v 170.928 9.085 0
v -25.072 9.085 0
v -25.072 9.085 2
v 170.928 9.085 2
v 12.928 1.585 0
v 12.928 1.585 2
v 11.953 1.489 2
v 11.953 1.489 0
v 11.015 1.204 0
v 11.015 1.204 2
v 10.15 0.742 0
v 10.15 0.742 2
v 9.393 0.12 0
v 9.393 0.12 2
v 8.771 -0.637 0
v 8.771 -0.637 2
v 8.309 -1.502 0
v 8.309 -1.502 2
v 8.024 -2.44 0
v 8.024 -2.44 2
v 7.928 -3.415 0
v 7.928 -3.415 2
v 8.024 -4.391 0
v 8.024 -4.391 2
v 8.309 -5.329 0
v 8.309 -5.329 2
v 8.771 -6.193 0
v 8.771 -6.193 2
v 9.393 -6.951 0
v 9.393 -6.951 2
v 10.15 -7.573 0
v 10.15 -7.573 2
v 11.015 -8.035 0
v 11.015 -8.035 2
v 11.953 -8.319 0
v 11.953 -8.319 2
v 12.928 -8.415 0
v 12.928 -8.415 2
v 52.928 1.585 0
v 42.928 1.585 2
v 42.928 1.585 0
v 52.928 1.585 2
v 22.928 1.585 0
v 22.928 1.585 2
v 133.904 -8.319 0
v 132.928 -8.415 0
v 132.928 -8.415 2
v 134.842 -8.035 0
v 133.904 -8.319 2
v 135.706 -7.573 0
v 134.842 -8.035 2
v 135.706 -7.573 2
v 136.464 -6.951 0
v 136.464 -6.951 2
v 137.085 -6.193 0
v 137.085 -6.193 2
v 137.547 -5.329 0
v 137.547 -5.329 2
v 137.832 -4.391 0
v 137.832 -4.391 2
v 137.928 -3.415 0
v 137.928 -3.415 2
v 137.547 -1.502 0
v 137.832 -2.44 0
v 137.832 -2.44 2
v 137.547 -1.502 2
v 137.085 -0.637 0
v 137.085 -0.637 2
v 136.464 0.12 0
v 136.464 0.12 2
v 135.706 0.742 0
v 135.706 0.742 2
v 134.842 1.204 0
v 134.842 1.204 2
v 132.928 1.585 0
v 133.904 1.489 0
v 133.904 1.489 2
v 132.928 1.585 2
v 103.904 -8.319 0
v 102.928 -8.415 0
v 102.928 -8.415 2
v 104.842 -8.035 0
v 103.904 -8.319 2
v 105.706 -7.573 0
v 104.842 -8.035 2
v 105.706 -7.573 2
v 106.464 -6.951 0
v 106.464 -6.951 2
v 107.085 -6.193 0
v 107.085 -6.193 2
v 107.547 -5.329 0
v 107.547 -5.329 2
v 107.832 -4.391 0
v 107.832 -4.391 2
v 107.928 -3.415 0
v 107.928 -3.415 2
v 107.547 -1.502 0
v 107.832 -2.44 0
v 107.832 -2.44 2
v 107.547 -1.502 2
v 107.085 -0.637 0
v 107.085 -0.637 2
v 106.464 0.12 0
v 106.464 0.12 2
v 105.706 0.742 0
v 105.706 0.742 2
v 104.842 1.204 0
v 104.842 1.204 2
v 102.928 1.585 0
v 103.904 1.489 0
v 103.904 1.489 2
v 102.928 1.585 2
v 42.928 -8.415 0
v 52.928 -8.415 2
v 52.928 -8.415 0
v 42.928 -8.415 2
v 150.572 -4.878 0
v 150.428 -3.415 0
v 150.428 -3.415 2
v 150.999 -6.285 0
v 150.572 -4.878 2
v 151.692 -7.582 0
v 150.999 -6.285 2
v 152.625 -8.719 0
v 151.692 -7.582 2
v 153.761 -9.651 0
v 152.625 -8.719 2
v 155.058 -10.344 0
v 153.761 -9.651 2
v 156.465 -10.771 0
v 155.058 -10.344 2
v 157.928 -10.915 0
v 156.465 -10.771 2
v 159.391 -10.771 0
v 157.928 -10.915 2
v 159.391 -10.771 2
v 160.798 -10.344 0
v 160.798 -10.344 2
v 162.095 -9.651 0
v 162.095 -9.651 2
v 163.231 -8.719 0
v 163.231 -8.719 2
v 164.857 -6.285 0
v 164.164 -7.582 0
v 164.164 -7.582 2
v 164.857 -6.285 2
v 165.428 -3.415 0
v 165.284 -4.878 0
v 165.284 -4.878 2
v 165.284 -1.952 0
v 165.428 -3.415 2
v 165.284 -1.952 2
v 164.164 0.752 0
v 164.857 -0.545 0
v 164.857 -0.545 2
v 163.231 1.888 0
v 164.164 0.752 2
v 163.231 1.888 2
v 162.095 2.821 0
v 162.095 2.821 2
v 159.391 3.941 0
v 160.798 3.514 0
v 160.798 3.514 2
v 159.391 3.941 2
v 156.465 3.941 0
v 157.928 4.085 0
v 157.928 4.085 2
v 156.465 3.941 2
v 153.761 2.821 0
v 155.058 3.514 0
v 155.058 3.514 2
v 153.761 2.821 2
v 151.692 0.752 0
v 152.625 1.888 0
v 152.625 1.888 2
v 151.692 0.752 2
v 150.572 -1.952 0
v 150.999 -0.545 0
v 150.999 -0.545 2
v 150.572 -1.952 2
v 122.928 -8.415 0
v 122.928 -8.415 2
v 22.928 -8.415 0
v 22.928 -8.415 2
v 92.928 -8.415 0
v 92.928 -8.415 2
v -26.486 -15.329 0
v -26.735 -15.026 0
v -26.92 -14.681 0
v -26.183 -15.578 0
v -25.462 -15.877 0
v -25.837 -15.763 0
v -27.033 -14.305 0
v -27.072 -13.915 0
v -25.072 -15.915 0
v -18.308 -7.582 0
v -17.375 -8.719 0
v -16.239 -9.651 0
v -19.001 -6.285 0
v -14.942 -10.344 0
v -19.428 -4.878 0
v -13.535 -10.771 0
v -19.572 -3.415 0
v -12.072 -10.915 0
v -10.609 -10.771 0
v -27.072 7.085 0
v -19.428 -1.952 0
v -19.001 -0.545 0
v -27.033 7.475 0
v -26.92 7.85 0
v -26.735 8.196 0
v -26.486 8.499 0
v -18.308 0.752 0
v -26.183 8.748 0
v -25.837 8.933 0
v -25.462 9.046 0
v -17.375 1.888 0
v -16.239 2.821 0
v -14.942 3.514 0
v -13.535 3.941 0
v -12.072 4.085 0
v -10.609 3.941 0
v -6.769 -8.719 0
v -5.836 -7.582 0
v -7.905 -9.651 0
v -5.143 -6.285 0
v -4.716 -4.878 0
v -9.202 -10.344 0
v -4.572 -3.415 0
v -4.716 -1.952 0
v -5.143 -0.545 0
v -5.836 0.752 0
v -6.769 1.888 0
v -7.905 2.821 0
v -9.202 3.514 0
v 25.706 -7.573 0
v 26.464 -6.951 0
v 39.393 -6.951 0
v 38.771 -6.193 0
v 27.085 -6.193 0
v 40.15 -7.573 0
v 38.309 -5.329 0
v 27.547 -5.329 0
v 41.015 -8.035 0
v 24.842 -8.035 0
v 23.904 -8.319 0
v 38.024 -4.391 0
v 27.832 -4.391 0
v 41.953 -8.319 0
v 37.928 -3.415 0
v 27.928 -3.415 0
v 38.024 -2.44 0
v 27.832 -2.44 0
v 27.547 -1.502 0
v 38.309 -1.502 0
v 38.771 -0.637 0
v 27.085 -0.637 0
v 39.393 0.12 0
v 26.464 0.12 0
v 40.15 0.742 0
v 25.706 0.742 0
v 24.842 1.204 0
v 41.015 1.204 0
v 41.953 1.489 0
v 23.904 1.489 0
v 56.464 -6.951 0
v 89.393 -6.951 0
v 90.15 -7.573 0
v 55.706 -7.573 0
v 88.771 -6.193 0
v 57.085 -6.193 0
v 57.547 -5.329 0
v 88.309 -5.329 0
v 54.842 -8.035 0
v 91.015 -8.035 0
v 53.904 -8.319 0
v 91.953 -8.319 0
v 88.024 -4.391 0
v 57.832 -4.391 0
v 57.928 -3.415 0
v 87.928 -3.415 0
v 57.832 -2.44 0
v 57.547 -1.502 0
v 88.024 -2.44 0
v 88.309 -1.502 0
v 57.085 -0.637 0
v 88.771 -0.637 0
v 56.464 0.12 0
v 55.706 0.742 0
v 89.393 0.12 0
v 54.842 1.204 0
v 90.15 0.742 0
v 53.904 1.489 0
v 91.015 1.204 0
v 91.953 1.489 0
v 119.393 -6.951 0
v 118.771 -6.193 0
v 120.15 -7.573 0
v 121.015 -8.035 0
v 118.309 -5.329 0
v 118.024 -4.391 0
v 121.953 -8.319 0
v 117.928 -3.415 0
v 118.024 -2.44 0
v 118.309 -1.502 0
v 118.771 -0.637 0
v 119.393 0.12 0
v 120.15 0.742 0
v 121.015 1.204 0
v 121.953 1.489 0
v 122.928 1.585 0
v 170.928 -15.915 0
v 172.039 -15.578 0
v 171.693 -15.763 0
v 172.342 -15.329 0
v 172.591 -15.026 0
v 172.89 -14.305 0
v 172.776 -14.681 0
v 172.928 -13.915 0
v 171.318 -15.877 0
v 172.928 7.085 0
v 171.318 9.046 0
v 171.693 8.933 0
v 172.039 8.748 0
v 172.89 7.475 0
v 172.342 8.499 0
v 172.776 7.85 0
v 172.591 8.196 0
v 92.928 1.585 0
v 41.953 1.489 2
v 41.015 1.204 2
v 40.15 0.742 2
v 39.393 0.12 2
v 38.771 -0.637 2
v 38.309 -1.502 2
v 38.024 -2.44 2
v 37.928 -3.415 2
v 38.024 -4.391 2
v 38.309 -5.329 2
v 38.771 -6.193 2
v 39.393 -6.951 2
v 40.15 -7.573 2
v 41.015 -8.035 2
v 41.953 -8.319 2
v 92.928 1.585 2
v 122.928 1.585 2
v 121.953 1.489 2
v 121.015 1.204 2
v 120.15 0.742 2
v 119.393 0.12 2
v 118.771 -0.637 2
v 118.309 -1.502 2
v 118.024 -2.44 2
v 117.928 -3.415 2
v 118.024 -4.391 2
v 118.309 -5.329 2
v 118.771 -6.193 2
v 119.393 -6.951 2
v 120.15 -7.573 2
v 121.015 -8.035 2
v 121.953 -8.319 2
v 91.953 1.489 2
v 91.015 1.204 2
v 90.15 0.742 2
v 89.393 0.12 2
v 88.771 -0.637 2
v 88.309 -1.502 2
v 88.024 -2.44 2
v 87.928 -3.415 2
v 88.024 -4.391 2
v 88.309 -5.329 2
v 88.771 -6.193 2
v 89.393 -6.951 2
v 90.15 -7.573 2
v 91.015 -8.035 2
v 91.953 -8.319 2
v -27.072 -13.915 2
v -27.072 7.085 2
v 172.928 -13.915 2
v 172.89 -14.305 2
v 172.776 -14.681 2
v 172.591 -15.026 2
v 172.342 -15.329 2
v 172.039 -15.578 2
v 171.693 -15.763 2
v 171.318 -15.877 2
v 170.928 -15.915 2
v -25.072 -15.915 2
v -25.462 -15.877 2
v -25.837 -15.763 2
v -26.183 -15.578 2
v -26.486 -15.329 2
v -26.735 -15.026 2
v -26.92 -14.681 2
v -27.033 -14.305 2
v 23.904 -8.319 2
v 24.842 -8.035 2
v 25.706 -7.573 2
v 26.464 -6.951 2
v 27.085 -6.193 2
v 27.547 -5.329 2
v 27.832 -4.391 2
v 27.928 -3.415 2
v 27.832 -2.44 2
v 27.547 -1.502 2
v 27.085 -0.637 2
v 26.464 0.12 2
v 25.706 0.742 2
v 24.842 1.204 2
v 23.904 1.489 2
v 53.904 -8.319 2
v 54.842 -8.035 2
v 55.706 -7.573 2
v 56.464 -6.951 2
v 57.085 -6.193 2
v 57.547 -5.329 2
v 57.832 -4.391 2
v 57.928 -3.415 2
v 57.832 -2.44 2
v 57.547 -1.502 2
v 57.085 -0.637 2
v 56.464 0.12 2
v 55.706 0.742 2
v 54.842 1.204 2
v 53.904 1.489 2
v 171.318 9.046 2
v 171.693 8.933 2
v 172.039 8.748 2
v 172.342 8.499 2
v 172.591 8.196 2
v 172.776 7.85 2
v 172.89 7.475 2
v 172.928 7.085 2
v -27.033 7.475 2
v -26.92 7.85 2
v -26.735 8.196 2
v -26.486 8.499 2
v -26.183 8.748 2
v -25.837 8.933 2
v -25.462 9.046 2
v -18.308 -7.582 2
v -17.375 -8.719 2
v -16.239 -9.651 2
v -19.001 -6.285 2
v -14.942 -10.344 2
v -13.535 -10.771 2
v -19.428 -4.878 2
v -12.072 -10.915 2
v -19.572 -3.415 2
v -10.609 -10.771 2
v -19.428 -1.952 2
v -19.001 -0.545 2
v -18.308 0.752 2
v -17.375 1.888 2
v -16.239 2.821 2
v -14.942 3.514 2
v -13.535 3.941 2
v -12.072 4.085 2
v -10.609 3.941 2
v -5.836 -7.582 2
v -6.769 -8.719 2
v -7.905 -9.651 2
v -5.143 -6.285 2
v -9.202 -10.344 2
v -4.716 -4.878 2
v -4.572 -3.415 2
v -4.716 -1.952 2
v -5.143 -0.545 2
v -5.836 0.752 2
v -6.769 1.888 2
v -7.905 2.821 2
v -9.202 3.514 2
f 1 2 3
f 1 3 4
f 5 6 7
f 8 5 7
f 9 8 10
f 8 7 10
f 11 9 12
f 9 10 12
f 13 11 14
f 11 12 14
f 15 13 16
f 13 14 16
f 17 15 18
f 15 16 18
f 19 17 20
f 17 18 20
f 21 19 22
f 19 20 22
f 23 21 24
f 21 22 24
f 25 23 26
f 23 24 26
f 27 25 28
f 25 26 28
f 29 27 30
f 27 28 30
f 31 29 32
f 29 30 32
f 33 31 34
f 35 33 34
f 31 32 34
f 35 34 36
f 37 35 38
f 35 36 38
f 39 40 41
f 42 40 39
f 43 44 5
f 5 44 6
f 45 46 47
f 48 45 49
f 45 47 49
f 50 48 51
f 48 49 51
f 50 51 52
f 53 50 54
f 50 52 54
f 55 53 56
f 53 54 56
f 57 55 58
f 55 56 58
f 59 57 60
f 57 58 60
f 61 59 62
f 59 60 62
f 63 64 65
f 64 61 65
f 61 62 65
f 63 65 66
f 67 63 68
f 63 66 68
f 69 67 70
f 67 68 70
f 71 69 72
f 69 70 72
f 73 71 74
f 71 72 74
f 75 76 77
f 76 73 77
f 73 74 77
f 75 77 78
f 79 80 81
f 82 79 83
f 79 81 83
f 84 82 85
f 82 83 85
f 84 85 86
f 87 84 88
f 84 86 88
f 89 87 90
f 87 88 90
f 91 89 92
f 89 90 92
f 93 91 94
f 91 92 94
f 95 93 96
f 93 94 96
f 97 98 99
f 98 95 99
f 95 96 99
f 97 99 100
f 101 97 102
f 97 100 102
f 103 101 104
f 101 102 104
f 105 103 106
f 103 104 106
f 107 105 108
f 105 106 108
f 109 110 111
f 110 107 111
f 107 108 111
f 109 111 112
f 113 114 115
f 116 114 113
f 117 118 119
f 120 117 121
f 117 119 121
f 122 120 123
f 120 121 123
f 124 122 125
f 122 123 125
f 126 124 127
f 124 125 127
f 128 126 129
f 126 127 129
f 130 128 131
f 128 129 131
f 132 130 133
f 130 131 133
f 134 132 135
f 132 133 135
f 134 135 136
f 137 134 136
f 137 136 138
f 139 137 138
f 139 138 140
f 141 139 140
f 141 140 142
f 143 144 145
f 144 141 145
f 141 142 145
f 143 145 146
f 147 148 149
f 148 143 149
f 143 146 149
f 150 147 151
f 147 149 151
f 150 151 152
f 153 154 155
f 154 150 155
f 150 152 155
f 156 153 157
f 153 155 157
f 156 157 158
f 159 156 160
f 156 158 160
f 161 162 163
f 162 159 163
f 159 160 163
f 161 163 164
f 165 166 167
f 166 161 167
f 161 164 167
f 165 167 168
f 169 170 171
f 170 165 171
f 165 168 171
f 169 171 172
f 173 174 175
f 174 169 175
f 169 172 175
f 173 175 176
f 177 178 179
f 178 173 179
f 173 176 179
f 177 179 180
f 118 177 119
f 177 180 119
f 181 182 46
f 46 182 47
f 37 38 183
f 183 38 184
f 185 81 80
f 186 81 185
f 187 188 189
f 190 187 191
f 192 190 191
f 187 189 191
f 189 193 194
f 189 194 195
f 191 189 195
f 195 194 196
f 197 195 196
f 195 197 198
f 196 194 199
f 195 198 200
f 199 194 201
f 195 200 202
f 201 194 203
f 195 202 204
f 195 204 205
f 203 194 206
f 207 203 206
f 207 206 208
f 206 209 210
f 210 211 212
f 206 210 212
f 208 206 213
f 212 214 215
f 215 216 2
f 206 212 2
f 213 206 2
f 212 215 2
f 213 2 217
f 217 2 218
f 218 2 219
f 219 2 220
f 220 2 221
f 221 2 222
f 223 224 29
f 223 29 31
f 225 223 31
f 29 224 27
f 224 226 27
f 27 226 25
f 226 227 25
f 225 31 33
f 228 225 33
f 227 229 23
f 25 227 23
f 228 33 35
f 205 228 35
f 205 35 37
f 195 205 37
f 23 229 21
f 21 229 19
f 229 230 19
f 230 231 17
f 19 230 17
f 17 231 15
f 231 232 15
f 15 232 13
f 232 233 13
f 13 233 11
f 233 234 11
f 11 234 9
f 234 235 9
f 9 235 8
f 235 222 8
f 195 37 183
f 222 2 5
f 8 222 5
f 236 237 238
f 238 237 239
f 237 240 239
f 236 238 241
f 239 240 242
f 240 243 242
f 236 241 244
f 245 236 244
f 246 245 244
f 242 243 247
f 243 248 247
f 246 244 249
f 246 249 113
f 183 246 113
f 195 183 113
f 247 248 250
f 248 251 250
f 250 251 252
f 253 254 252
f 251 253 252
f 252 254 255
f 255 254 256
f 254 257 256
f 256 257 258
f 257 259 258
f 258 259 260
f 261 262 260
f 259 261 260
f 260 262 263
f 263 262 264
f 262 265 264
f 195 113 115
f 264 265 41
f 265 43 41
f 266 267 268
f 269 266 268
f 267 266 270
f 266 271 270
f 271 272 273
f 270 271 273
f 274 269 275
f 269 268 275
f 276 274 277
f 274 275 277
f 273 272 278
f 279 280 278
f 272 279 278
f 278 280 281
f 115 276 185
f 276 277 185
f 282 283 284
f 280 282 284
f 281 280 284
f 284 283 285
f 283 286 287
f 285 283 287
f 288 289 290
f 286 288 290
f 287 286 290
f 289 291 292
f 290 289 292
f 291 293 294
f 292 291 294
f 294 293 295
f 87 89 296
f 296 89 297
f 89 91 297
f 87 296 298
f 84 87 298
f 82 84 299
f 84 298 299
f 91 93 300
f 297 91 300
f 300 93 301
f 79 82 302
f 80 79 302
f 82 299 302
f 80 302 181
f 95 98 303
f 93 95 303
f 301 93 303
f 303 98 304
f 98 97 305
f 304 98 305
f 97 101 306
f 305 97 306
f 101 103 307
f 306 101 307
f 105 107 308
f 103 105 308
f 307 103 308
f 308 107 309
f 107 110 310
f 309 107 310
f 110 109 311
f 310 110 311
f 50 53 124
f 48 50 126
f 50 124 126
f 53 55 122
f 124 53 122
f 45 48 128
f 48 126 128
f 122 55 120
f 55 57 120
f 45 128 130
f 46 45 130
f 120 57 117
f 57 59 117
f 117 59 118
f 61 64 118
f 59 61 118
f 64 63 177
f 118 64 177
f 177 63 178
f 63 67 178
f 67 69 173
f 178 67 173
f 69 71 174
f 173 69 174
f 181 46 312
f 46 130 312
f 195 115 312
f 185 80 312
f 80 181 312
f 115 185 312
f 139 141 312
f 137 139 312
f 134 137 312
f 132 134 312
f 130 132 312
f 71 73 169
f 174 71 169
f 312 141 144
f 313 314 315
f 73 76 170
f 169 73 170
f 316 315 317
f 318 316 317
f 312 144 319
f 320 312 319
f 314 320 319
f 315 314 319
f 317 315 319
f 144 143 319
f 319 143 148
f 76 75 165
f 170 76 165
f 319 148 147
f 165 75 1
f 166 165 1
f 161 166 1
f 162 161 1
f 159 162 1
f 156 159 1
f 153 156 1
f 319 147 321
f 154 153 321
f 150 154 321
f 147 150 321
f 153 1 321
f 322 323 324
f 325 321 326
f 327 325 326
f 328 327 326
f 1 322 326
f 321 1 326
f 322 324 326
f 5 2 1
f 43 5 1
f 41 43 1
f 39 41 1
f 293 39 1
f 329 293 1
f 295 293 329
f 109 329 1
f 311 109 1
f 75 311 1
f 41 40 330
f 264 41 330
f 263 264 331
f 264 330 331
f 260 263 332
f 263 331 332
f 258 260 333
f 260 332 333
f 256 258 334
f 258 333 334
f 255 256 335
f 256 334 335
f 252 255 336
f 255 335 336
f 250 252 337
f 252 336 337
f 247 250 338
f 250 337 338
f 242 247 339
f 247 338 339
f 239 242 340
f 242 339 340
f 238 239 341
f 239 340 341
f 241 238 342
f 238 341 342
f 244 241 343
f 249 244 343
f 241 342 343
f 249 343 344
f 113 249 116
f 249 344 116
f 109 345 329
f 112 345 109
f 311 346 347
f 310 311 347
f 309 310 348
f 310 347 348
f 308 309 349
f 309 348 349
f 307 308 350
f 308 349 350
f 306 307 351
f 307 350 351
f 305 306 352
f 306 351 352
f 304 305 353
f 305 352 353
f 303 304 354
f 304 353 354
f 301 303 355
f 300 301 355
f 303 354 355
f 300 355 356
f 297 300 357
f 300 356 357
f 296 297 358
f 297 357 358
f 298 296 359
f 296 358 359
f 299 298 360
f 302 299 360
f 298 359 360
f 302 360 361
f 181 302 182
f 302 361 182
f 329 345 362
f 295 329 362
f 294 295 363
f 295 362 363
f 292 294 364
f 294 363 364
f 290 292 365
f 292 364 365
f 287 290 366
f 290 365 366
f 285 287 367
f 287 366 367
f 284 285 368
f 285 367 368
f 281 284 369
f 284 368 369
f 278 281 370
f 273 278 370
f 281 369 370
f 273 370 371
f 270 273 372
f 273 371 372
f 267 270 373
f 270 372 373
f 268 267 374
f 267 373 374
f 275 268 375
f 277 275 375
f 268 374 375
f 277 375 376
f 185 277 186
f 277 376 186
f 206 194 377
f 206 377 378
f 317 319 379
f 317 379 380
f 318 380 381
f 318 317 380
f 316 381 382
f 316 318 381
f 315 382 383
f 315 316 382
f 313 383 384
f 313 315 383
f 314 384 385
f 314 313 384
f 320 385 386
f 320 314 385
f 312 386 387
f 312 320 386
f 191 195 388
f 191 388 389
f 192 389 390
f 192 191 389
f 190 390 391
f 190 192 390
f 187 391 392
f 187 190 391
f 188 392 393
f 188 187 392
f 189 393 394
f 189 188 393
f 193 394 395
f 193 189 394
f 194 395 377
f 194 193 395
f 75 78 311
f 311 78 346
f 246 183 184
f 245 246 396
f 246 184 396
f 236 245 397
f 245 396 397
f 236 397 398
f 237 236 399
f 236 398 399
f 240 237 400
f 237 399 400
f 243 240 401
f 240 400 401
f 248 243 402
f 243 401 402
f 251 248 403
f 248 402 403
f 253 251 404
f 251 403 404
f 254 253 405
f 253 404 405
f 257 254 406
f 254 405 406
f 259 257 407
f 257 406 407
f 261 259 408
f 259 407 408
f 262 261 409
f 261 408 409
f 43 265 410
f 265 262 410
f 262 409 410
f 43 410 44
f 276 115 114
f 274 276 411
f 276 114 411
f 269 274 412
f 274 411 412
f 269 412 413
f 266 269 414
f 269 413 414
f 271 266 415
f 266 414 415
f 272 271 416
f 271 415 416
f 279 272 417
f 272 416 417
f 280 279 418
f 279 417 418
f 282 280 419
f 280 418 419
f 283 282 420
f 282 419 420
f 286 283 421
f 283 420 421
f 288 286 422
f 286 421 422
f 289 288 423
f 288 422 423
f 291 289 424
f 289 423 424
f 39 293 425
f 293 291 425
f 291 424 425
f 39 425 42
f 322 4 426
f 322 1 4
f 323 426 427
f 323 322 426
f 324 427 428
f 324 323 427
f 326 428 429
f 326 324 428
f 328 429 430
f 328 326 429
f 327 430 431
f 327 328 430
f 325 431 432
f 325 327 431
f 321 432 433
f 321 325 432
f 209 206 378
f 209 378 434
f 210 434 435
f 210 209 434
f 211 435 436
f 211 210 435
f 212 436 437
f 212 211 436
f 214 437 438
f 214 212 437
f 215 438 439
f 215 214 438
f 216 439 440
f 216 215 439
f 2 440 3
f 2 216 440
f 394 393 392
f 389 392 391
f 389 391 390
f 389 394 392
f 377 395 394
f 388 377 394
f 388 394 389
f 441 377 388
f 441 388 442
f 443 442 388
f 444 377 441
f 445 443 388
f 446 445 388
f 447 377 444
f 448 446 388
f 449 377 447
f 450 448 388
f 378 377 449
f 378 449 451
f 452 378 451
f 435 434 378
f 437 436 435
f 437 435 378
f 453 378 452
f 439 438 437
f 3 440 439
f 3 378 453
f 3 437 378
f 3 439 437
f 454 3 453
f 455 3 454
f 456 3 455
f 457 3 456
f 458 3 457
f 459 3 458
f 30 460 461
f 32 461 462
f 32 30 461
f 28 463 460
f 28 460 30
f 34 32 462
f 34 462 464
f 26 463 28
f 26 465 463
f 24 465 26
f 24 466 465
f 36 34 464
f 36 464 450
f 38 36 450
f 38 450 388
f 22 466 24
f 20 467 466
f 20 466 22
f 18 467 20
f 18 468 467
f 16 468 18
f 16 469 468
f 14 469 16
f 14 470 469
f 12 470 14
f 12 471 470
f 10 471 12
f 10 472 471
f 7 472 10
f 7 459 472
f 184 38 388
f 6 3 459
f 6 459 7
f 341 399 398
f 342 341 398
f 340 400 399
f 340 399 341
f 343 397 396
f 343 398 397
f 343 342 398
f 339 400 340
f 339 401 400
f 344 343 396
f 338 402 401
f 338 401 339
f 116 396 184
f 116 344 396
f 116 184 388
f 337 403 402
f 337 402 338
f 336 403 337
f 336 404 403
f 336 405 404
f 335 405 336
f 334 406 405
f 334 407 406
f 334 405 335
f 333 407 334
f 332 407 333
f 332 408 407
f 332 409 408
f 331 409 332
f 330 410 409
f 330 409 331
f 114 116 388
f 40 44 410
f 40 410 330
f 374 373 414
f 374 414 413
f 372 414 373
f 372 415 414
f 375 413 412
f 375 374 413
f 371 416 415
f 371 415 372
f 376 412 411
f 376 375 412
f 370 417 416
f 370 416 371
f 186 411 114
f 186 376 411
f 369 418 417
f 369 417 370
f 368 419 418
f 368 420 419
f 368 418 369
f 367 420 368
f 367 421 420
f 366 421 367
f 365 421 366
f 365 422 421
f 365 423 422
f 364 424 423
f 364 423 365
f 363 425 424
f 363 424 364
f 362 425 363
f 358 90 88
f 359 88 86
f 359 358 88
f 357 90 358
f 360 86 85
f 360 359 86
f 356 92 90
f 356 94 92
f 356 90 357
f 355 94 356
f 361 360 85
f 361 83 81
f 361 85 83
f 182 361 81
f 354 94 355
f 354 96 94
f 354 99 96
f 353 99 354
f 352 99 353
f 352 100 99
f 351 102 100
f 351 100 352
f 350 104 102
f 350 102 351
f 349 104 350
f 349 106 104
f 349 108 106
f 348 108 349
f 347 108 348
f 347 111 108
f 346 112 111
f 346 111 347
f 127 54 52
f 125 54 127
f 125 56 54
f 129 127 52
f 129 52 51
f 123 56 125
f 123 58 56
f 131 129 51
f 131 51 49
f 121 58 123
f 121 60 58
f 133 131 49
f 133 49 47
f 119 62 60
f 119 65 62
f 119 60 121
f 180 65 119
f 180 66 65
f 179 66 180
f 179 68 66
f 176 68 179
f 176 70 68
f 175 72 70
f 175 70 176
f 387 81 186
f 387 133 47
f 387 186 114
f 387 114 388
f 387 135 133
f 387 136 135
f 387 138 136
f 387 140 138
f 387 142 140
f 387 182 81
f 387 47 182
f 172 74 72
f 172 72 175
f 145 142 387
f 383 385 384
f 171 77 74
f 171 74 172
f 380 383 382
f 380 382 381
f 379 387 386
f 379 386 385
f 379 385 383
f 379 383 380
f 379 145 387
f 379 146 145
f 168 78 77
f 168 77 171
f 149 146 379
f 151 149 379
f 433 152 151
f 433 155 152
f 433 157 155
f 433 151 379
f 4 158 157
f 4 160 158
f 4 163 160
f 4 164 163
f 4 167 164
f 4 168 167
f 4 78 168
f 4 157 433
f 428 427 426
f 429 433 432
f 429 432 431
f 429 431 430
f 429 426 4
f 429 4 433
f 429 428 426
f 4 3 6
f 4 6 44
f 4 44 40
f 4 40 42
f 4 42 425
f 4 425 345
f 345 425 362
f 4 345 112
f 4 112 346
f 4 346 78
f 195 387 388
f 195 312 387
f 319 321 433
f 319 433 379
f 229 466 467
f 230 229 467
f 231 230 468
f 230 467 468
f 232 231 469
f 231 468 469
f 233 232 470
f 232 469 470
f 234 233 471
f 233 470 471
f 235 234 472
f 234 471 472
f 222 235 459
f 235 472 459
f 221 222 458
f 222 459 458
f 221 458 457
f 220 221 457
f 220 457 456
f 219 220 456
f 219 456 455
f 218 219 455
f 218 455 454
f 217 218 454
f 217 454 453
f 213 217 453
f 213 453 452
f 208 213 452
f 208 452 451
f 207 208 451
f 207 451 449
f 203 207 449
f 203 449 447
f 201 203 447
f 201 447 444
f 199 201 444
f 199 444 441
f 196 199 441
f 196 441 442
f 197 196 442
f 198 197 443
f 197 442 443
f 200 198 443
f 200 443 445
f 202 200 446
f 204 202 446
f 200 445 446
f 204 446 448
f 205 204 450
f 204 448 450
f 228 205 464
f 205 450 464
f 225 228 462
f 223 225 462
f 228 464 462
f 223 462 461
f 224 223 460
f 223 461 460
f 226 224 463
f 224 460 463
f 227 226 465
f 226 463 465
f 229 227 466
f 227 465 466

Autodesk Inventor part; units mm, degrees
ref_plane "YZ Plane" through (0, 0, 0) normal (1, 0, 0) x (0, 1, 0)
ref_plane "XZ Plane" through (0, 0, 0) normal (0, 1, 0) x (-1, 0, 0)
sketch "Sketch1" plane through (0, 0, 0) normal (0, 0, 1) x (1, 0, 0)
  line L0 (-25.0719, 9.0848) -> (170.9281, 9.0848)
  line L1 (172.9281, 7.0848) -> (172.9281, -13.9152)
  line L2 (170.9281, -15.9152) -> (-25.0719, -15.9152)
  line L3 (-27.0719, -13.9152) -> (-27.0719, 7.0848)
  arc A0 (-25.0719, 9.0848) -> (-27.0719, 7.0848) centre (-25.0719, 7.0848) ccw
  arc A1 (-27.0719, -13.9152) -> (-25.0719, -15.9152) centre (-25.0719, -13.9152) ccw
  arc A2 (170.9281, -15.9152) -> (172.9281, -13.9152) centre (170.9281, -13.9152) ccw
  arc A3 (172.9281, 7.0848) -> (170.9281, 9.0848) centre (170.9281, 7.0848) ccw
  point P0 (0, 0)
  point P1 (172.9281, -15.9152)
  point P2 (172.9281, 9.0848)
  point P3 (-27.0719, -15.9152)
  dimension "d0" = 200
  dimension "d1" = 25
  dimension "d2" = 2
extrude "Extrusion1" add sketch "Sketch1" along normal blind 2
sketch "Sketch2" plane through (0, 0, 2) normal (0, 0, 1) x (1, 0, 0)
  line L0 (170.9281, -15.9152) -> (-25.0719, -15.9152) projected
  line L1 (72.9281, -15.9152) -> (72.9281, 9.0848)
  line L2 (170.9281, 9.0848) -> (-25.0719, 9.0848) projected
  line L3 (-27.0719, 7.0848) -> (-27.0719, -13.9152) projected
  line L4 (-27.0719, -3.4152) -> (172.9281, -3.4152)
  line L5 (172.9281, 7.0848) -> (172.9281, -13.9152) projected
  circle A0 centre (-12.0719, -3.4152) radius 7.5
  line L6 (7.9281, -3.4152) -> (27.9281, -3.4152) construction
  line L7 (12.9281, -8.4152) -> (22.9281, -8.4152)
  line L8 (22.9281, 1.5848) -> (12.9281, 1.5848)
  arc A1 (12.9281, 1.5848) -> (12.9281, -8.4152) centre (12.9281, -3.4152) ccw
  arc A2 (22.9281, -8.4152) -> (22.9281, 1.5848) centre (22.9281, -3.4152) ccw
  line L9 (37.9281, -3.4152) -> (57.9281, -3.4152) construction
  line L10 (42.9281, 1.5848) -> (52.9281, 1.5848)
  line L11 (52.9281, -8.4152) -> (42.9281, -8.4152)
  arc A3 (42.9281, 1.5848) -> (42.9281, -8.4152) centre (42.9281, -3.4152) ccw
  arc A4 (52.9281, -8.4152) -> (52.9281, 1.5848) centre (52.9281, -3.4152) ccw
  point P0 (0, 0)
  point P1 (17.9281, -3.4152)
  point P2 (47.9281, -3.4152)
  dimension "d5" = 15
  dimension "d6" = 15
  dimension "d7" = 20
  dimension "d8" = 10
  dimension "d9" = 20
  dimension "d10" = 30
  dimension "d11" = 25
extrude "Extrusion2" cut sketch "Sketch2" against normal blind 2
ref_plane "Work Plane1" through (72.9281, -13.9152, 0) normal (1, 0, 0) x (0, 0, -1)
mirror "Mirror1" about plane through (72.9281, -13.9152, 0) normal (1, 0, 0) of "Extrusion2"
properties part number "Side Plate"
